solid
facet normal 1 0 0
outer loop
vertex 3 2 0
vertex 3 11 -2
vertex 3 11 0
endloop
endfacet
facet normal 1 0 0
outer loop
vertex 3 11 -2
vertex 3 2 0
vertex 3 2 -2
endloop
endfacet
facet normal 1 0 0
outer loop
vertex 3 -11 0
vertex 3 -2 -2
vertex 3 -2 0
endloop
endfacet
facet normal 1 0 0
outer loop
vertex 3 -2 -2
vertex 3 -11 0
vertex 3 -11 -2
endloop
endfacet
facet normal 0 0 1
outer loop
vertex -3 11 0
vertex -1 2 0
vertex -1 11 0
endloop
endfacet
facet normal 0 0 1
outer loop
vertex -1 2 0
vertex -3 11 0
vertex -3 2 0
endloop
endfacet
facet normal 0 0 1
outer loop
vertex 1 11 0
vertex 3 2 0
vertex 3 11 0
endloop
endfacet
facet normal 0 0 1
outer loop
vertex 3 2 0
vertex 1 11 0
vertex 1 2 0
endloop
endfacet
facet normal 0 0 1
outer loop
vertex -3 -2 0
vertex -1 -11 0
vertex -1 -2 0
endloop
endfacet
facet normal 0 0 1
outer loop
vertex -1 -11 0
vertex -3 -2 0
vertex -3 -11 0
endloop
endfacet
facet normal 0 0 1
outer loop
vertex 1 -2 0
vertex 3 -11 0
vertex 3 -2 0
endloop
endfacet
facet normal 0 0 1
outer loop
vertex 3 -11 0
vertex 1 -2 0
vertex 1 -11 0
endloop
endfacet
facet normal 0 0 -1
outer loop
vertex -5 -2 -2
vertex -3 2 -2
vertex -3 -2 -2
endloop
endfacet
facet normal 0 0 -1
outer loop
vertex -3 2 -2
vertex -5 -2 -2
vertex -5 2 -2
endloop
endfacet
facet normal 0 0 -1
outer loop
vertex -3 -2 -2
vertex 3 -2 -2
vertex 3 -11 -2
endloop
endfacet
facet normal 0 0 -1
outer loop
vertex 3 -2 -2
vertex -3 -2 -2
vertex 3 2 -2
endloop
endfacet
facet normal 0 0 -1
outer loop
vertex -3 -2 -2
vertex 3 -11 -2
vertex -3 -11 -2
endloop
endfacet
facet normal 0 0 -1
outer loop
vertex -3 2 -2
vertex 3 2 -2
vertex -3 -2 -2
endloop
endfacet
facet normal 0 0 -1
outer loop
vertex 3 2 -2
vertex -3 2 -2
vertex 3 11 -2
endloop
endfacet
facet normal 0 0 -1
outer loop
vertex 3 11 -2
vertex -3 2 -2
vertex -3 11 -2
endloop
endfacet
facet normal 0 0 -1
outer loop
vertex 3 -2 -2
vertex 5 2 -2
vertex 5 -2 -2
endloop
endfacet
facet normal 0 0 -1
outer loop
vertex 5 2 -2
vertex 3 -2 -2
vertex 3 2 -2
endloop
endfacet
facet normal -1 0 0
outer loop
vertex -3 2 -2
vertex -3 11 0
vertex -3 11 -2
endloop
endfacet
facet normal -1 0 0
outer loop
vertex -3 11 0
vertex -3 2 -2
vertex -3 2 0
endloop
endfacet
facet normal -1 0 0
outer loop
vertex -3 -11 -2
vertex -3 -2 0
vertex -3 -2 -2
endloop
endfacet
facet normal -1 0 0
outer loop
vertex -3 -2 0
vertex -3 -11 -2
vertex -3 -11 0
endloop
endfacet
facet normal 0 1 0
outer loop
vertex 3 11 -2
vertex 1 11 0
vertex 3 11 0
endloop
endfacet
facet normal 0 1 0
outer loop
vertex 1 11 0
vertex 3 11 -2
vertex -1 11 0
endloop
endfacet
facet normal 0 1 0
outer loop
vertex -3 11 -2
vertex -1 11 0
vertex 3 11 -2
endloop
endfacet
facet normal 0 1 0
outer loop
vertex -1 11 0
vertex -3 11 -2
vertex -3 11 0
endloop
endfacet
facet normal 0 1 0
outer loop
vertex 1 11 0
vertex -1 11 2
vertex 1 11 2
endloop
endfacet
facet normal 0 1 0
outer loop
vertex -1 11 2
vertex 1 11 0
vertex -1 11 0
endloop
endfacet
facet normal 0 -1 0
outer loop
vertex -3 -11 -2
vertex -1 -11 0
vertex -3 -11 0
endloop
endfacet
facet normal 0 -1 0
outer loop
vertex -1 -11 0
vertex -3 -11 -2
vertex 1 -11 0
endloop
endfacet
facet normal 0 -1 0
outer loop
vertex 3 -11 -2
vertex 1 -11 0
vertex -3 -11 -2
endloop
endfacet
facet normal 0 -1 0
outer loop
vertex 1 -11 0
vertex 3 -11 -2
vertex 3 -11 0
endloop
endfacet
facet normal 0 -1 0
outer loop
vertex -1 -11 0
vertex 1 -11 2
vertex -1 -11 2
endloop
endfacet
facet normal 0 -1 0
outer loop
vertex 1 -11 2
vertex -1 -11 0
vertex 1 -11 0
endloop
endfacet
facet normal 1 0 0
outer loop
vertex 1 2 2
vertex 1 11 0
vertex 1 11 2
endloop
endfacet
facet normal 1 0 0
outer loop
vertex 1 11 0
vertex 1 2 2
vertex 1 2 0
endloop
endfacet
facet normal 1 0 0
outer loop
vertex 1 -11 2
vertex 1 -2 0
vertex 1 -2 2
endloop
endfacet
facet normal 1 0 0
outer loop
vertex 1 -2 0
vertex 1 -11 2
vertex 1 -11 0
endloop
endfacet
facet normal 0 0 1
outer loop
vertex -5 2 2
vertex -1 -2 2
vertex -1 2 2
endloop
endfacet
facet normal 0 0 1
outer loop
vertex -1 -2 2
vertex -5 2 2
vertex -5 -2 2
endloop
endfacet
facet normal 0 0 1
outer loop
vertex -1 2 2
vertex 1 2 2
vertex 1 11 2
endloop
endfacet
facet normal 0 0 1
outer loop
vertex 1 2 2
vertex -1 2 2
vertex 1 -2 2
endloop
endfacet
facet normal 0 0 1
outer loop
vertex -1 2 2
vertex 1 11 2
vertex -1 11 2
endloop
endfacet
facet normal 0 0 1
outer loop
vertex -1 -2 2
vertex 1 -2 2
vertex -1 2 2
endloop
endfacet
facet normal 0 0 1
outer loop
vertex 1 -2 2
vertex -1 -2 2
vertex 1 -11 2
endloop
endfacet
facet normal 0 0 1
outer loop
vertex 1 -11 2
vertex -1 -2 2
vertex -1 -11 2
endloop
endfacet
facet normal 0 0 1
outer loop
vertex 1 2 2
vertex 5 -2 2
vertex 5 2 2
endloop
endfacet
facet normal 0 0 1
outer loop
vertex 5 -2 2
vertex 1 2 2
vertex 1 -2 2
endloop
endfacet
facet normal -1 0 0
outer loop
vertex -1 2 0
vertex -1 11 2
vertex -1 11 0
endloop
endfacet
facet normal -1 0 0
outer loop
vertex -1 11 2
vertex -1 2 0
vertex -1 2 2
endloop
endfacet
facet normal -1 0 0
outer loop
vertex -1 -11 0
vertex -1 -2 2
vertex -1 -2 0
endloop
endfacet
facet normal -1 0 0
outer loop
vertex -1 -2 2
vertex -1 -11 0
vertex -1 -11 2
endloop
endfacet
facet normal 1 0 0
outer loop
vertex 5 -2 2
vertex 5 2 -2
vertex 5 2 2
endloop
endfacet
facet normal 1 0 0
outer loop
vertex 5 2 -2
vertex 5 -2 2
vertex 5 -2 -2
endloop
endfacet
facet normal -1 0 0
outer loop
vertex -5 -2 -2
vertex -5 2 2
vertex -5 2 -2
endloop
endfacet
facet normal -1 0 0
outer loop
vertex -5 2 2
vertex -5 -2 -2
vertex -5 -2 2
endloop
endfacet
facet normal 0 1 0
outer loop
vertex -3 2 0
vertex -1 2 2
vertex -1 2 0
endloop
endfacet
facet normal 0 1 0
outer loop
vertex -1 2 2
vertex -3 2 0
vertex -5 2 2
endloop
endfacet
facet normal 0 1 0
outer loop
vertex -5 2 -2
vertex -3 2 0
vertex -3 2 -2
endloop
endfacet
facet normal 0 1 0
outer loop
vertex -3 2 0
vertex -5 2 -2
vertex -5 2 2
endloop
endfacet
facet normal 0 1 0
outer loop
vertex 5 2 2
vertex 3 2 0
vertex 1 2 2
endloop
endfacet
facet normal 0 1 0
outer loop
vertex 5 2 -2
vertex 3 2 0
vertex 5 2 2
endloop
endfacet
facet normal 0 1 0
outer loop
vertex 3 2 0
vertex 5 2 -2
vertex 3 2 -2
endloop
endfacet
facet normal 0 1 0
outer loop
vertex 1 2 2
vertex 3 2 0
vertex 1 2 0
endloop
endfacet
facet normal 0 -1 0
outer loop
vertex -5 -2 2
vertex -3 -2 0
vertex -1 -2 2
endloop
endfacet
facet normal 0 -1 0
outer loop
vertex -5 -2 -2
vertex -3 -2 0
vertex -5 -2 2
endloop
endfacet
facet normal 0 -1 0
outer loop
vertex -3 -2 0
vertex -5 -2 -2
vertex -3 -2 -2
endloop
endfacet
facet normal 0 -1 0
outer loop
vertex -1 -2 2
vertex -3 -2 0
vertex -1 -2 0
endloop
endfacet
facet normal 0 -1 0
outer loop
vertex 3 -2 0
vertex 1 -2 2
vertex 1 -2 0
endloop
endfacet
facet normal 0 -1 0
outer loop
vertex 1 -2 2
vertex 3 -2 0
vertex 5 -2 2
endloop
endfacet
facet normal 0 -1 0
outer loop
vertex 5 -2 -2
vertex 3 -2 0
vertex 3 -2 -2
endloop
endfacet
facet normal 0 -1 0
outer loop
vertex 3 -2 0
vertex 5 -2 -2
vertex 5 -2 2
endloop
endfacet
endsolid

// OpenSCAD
// file: ModularDungeonTileLibrary.scad
//Constants
wallleft = 0;
wallbottom = 1;
wallright = 2;
walltop = 3;
wallcenter = 4;
walldoubleright = 5;


//Variables
size = 32;
connectorlength = size-10;
connectorwidth = 6;
connectorheight = 4;
baseheight = 8;
topperheight = 2;
topperrounded = true;
walllength = size;
wallheight = 25;
wallwidth = 6;
wallwidththin = 4;


//Functions
function hypotenuse_ra(side_a, side_b) =
    sqrt(pow(side_a, 2) + pow(side_b, 2));
    
    
//Modules    
module mtdl_Base_Connector(cw,cl,ch) {
    translate([-connectorwidth/2,-connectorlength/2,-connectorheight/2]) {
        cube([cw,cl,ch/2]);
        translate([cw/3,0,ch/2])
            cube([cw/3,cl,ch/2]);
        translate([-(cw-2)/2,cl/2-2,0])
            cube([cw+4,4,ch]);
    }
}

module mdtl_Base(s,bh)
{
    cube([s,s,bh]);
}

module mdtl_Topper(s,bh,th,tr)
{
    if (tr) {
        translate([0,0,bh])
            intersection() {
                difference () {
                        cube([s,s,th]);
                        union () {
                        rotate(a=45, v=[1,0,0])
                            cube([s,th*2,th*2]);
                        translate([0,s,0])
                            rotate(a=45, v=[1,0,0])
                                cube([s,th*2,th*2]);
                        rotate(a=-45, v=[0,1,0])
                            cube([th*2,s,th*2]);
                        translate([s,0,0])
                            rotate(a=-45, v=[0,1,0])
                                cube([th*2,s,th*2]);
                        }
                }
                translate([s/2,s/2,0])
                    cylinder(
                        h=th, 
                        r1=hypotenuse_ra(s/2-1.2, s/2-1.2), 
                        r2=hypotenuse_ra(s/2-th-.8, s/2-th-.8), 
                        center=false, 
                        $fa=.1);
            }    
    }
    else {
        translate([0,0,bh])
            difference() {
                cube([s,s,th]);
                union () {
                rotate(a=45, v=[1,0,0])
                    cube([s,th*2,th*2]);
                translate([0,s,0])
                    rotate(a=45, v=[1,0,0])
                        cube([s,th*2,th*2]);
                rotate(a=-45, v=[0,1,0])
                    cube([th*2,s,th*2]);
                translate([s,0,0])
                    rotate(a=-45, v=[0,1,0])
                        cube([th*2,s,th*2]);
                }
            }    
    }
}

module mdtl_Base_1x1(s,bh,th,tr) 
{
    difference () {
        union () {
            mdtl_Base(s,bh);
            mdtl_Topper(s,bh,th,tr);
        }
        union () {
            translate([size/2,size,baseheight/2])
                rotate([0,180,0])
                    mtdl_Base_Connector(connectorwidth,connectorlength,connectorheight);
            translate([size/2,0,baseheight/2])
                rotate([0,180,0])
                    mtdl_Base_Connector(connectorwidth,connectorlength,connectorheight);
            translate([size,size/2,baseheight/2])
                rotate([0,180,90])
                    mtdl_Base_Connector(connectorwidth,connectorlength,connectorheight);
            translate([0,size/2,baseheight/2])
                rotate([0,180,90])
                    mtdl_Base_Connector(connectorwidth,connectorlength,connectorheight);
        }
    }
}

module mdtl_Base_1x2(s,bh,th,tr)
{
    union () {
        mdtl_Base_1x1(s,bh,th,tr);
        translate([s,0,0])
            mdtl_Base_1x1(s,bh,th,tr);
    }
}
 
module mdtl_Base_2x2(s,bh,th,tr)
{
    union () {
        mdtl_Base_1x2(s,bh,th,tr);
        translate([0,s,0])
            mdtl_Base_1x2(s,bh,th,tr);
    }
}
 
module mdtl_Base_2x4(s,bh,th,tr)
{
    union () {
        mdtl_Base_2x2(s,bh,th,tr);
        translate([s*2,0,0])
            mdtl_Base_2x2(s,bh,th,tr);
    }
}
 
module mdtl_Base_4x4(s,bh,th,tr)
{
    union () {
        mdtl_Base_2x4(s,bh,th,tr);
        translate([0,s*2,0])
            mdtl_Base_2x4(s,bh,th,tr);
    }
}
 
module mdtl_Wall_1(w,l,h)
{
    translate([0,0,baseheight])
        cube([w,l,h]);   
}

module mdtl_Wall_1_Position(w,l,h,p)
{
    if (p==0) {
        mdtl_Wall_1(w,l,h);
    }
    
    else if (p==1) {
        rotate(a=-90)
           translate([-w,0,0])
               mdtl_Wall_1(w,l,h);       
    }
    
    else if (p==2) {
        translate([(size)-w,0,0])
            mdtl_Wall_1(w,l,h);
    }
    
    else if (p==3) {
        rotate(a=-90)
            translate([-l,0,0])
                mdtl_Wall_1(w,l,h);
    }
    
    else if (p==4) {
        translate([(size)-w/2,0,0])
            mdtl_Wall_1(w,l,h);
    }
    
    else if (p==5) {
        translate([(size*2)-w,0,0])
           mdtl_Wall_1(w,l,h);       
    }
}

module mdtl_Wall_2(w,l,h)
{
    union() {
        mdtl_Wall_1(w,l,h);
        translate([0,l,0])
            mdtl_Wall_1(w,l,h);
    }
}

module mdtl_Wall_2_Position(w,l,h,p)
{
    if (p==0) {
        mdtl_Wall_2(w,l,h);
    }
    
    else if (p==1) {
        rotate(a=-90)
            translate([-w,0,0])
                mdtl_Wall_2(w,l,h);
    }
    
    else if (p==2) {
    translate([(size*2)-w,0,0])
        mdtl_Wall_2(w,l,h);
    }
    
    else if (p==3) {
        rotate(a=-90)
            translate([-l*2,0,0])
                mdtl_Wall_2(w,l,h);
    }
    
    else if (p==4) {
        translate([(size)-w/2,0,0])
            mdtl_Wall_2(w,l,h);
    }
}
// main file
include <ModularDungeonTileLibrary.scad>; 


mtdl_Base_Connector(connectorwidth,connectorlength,connectorheight);
